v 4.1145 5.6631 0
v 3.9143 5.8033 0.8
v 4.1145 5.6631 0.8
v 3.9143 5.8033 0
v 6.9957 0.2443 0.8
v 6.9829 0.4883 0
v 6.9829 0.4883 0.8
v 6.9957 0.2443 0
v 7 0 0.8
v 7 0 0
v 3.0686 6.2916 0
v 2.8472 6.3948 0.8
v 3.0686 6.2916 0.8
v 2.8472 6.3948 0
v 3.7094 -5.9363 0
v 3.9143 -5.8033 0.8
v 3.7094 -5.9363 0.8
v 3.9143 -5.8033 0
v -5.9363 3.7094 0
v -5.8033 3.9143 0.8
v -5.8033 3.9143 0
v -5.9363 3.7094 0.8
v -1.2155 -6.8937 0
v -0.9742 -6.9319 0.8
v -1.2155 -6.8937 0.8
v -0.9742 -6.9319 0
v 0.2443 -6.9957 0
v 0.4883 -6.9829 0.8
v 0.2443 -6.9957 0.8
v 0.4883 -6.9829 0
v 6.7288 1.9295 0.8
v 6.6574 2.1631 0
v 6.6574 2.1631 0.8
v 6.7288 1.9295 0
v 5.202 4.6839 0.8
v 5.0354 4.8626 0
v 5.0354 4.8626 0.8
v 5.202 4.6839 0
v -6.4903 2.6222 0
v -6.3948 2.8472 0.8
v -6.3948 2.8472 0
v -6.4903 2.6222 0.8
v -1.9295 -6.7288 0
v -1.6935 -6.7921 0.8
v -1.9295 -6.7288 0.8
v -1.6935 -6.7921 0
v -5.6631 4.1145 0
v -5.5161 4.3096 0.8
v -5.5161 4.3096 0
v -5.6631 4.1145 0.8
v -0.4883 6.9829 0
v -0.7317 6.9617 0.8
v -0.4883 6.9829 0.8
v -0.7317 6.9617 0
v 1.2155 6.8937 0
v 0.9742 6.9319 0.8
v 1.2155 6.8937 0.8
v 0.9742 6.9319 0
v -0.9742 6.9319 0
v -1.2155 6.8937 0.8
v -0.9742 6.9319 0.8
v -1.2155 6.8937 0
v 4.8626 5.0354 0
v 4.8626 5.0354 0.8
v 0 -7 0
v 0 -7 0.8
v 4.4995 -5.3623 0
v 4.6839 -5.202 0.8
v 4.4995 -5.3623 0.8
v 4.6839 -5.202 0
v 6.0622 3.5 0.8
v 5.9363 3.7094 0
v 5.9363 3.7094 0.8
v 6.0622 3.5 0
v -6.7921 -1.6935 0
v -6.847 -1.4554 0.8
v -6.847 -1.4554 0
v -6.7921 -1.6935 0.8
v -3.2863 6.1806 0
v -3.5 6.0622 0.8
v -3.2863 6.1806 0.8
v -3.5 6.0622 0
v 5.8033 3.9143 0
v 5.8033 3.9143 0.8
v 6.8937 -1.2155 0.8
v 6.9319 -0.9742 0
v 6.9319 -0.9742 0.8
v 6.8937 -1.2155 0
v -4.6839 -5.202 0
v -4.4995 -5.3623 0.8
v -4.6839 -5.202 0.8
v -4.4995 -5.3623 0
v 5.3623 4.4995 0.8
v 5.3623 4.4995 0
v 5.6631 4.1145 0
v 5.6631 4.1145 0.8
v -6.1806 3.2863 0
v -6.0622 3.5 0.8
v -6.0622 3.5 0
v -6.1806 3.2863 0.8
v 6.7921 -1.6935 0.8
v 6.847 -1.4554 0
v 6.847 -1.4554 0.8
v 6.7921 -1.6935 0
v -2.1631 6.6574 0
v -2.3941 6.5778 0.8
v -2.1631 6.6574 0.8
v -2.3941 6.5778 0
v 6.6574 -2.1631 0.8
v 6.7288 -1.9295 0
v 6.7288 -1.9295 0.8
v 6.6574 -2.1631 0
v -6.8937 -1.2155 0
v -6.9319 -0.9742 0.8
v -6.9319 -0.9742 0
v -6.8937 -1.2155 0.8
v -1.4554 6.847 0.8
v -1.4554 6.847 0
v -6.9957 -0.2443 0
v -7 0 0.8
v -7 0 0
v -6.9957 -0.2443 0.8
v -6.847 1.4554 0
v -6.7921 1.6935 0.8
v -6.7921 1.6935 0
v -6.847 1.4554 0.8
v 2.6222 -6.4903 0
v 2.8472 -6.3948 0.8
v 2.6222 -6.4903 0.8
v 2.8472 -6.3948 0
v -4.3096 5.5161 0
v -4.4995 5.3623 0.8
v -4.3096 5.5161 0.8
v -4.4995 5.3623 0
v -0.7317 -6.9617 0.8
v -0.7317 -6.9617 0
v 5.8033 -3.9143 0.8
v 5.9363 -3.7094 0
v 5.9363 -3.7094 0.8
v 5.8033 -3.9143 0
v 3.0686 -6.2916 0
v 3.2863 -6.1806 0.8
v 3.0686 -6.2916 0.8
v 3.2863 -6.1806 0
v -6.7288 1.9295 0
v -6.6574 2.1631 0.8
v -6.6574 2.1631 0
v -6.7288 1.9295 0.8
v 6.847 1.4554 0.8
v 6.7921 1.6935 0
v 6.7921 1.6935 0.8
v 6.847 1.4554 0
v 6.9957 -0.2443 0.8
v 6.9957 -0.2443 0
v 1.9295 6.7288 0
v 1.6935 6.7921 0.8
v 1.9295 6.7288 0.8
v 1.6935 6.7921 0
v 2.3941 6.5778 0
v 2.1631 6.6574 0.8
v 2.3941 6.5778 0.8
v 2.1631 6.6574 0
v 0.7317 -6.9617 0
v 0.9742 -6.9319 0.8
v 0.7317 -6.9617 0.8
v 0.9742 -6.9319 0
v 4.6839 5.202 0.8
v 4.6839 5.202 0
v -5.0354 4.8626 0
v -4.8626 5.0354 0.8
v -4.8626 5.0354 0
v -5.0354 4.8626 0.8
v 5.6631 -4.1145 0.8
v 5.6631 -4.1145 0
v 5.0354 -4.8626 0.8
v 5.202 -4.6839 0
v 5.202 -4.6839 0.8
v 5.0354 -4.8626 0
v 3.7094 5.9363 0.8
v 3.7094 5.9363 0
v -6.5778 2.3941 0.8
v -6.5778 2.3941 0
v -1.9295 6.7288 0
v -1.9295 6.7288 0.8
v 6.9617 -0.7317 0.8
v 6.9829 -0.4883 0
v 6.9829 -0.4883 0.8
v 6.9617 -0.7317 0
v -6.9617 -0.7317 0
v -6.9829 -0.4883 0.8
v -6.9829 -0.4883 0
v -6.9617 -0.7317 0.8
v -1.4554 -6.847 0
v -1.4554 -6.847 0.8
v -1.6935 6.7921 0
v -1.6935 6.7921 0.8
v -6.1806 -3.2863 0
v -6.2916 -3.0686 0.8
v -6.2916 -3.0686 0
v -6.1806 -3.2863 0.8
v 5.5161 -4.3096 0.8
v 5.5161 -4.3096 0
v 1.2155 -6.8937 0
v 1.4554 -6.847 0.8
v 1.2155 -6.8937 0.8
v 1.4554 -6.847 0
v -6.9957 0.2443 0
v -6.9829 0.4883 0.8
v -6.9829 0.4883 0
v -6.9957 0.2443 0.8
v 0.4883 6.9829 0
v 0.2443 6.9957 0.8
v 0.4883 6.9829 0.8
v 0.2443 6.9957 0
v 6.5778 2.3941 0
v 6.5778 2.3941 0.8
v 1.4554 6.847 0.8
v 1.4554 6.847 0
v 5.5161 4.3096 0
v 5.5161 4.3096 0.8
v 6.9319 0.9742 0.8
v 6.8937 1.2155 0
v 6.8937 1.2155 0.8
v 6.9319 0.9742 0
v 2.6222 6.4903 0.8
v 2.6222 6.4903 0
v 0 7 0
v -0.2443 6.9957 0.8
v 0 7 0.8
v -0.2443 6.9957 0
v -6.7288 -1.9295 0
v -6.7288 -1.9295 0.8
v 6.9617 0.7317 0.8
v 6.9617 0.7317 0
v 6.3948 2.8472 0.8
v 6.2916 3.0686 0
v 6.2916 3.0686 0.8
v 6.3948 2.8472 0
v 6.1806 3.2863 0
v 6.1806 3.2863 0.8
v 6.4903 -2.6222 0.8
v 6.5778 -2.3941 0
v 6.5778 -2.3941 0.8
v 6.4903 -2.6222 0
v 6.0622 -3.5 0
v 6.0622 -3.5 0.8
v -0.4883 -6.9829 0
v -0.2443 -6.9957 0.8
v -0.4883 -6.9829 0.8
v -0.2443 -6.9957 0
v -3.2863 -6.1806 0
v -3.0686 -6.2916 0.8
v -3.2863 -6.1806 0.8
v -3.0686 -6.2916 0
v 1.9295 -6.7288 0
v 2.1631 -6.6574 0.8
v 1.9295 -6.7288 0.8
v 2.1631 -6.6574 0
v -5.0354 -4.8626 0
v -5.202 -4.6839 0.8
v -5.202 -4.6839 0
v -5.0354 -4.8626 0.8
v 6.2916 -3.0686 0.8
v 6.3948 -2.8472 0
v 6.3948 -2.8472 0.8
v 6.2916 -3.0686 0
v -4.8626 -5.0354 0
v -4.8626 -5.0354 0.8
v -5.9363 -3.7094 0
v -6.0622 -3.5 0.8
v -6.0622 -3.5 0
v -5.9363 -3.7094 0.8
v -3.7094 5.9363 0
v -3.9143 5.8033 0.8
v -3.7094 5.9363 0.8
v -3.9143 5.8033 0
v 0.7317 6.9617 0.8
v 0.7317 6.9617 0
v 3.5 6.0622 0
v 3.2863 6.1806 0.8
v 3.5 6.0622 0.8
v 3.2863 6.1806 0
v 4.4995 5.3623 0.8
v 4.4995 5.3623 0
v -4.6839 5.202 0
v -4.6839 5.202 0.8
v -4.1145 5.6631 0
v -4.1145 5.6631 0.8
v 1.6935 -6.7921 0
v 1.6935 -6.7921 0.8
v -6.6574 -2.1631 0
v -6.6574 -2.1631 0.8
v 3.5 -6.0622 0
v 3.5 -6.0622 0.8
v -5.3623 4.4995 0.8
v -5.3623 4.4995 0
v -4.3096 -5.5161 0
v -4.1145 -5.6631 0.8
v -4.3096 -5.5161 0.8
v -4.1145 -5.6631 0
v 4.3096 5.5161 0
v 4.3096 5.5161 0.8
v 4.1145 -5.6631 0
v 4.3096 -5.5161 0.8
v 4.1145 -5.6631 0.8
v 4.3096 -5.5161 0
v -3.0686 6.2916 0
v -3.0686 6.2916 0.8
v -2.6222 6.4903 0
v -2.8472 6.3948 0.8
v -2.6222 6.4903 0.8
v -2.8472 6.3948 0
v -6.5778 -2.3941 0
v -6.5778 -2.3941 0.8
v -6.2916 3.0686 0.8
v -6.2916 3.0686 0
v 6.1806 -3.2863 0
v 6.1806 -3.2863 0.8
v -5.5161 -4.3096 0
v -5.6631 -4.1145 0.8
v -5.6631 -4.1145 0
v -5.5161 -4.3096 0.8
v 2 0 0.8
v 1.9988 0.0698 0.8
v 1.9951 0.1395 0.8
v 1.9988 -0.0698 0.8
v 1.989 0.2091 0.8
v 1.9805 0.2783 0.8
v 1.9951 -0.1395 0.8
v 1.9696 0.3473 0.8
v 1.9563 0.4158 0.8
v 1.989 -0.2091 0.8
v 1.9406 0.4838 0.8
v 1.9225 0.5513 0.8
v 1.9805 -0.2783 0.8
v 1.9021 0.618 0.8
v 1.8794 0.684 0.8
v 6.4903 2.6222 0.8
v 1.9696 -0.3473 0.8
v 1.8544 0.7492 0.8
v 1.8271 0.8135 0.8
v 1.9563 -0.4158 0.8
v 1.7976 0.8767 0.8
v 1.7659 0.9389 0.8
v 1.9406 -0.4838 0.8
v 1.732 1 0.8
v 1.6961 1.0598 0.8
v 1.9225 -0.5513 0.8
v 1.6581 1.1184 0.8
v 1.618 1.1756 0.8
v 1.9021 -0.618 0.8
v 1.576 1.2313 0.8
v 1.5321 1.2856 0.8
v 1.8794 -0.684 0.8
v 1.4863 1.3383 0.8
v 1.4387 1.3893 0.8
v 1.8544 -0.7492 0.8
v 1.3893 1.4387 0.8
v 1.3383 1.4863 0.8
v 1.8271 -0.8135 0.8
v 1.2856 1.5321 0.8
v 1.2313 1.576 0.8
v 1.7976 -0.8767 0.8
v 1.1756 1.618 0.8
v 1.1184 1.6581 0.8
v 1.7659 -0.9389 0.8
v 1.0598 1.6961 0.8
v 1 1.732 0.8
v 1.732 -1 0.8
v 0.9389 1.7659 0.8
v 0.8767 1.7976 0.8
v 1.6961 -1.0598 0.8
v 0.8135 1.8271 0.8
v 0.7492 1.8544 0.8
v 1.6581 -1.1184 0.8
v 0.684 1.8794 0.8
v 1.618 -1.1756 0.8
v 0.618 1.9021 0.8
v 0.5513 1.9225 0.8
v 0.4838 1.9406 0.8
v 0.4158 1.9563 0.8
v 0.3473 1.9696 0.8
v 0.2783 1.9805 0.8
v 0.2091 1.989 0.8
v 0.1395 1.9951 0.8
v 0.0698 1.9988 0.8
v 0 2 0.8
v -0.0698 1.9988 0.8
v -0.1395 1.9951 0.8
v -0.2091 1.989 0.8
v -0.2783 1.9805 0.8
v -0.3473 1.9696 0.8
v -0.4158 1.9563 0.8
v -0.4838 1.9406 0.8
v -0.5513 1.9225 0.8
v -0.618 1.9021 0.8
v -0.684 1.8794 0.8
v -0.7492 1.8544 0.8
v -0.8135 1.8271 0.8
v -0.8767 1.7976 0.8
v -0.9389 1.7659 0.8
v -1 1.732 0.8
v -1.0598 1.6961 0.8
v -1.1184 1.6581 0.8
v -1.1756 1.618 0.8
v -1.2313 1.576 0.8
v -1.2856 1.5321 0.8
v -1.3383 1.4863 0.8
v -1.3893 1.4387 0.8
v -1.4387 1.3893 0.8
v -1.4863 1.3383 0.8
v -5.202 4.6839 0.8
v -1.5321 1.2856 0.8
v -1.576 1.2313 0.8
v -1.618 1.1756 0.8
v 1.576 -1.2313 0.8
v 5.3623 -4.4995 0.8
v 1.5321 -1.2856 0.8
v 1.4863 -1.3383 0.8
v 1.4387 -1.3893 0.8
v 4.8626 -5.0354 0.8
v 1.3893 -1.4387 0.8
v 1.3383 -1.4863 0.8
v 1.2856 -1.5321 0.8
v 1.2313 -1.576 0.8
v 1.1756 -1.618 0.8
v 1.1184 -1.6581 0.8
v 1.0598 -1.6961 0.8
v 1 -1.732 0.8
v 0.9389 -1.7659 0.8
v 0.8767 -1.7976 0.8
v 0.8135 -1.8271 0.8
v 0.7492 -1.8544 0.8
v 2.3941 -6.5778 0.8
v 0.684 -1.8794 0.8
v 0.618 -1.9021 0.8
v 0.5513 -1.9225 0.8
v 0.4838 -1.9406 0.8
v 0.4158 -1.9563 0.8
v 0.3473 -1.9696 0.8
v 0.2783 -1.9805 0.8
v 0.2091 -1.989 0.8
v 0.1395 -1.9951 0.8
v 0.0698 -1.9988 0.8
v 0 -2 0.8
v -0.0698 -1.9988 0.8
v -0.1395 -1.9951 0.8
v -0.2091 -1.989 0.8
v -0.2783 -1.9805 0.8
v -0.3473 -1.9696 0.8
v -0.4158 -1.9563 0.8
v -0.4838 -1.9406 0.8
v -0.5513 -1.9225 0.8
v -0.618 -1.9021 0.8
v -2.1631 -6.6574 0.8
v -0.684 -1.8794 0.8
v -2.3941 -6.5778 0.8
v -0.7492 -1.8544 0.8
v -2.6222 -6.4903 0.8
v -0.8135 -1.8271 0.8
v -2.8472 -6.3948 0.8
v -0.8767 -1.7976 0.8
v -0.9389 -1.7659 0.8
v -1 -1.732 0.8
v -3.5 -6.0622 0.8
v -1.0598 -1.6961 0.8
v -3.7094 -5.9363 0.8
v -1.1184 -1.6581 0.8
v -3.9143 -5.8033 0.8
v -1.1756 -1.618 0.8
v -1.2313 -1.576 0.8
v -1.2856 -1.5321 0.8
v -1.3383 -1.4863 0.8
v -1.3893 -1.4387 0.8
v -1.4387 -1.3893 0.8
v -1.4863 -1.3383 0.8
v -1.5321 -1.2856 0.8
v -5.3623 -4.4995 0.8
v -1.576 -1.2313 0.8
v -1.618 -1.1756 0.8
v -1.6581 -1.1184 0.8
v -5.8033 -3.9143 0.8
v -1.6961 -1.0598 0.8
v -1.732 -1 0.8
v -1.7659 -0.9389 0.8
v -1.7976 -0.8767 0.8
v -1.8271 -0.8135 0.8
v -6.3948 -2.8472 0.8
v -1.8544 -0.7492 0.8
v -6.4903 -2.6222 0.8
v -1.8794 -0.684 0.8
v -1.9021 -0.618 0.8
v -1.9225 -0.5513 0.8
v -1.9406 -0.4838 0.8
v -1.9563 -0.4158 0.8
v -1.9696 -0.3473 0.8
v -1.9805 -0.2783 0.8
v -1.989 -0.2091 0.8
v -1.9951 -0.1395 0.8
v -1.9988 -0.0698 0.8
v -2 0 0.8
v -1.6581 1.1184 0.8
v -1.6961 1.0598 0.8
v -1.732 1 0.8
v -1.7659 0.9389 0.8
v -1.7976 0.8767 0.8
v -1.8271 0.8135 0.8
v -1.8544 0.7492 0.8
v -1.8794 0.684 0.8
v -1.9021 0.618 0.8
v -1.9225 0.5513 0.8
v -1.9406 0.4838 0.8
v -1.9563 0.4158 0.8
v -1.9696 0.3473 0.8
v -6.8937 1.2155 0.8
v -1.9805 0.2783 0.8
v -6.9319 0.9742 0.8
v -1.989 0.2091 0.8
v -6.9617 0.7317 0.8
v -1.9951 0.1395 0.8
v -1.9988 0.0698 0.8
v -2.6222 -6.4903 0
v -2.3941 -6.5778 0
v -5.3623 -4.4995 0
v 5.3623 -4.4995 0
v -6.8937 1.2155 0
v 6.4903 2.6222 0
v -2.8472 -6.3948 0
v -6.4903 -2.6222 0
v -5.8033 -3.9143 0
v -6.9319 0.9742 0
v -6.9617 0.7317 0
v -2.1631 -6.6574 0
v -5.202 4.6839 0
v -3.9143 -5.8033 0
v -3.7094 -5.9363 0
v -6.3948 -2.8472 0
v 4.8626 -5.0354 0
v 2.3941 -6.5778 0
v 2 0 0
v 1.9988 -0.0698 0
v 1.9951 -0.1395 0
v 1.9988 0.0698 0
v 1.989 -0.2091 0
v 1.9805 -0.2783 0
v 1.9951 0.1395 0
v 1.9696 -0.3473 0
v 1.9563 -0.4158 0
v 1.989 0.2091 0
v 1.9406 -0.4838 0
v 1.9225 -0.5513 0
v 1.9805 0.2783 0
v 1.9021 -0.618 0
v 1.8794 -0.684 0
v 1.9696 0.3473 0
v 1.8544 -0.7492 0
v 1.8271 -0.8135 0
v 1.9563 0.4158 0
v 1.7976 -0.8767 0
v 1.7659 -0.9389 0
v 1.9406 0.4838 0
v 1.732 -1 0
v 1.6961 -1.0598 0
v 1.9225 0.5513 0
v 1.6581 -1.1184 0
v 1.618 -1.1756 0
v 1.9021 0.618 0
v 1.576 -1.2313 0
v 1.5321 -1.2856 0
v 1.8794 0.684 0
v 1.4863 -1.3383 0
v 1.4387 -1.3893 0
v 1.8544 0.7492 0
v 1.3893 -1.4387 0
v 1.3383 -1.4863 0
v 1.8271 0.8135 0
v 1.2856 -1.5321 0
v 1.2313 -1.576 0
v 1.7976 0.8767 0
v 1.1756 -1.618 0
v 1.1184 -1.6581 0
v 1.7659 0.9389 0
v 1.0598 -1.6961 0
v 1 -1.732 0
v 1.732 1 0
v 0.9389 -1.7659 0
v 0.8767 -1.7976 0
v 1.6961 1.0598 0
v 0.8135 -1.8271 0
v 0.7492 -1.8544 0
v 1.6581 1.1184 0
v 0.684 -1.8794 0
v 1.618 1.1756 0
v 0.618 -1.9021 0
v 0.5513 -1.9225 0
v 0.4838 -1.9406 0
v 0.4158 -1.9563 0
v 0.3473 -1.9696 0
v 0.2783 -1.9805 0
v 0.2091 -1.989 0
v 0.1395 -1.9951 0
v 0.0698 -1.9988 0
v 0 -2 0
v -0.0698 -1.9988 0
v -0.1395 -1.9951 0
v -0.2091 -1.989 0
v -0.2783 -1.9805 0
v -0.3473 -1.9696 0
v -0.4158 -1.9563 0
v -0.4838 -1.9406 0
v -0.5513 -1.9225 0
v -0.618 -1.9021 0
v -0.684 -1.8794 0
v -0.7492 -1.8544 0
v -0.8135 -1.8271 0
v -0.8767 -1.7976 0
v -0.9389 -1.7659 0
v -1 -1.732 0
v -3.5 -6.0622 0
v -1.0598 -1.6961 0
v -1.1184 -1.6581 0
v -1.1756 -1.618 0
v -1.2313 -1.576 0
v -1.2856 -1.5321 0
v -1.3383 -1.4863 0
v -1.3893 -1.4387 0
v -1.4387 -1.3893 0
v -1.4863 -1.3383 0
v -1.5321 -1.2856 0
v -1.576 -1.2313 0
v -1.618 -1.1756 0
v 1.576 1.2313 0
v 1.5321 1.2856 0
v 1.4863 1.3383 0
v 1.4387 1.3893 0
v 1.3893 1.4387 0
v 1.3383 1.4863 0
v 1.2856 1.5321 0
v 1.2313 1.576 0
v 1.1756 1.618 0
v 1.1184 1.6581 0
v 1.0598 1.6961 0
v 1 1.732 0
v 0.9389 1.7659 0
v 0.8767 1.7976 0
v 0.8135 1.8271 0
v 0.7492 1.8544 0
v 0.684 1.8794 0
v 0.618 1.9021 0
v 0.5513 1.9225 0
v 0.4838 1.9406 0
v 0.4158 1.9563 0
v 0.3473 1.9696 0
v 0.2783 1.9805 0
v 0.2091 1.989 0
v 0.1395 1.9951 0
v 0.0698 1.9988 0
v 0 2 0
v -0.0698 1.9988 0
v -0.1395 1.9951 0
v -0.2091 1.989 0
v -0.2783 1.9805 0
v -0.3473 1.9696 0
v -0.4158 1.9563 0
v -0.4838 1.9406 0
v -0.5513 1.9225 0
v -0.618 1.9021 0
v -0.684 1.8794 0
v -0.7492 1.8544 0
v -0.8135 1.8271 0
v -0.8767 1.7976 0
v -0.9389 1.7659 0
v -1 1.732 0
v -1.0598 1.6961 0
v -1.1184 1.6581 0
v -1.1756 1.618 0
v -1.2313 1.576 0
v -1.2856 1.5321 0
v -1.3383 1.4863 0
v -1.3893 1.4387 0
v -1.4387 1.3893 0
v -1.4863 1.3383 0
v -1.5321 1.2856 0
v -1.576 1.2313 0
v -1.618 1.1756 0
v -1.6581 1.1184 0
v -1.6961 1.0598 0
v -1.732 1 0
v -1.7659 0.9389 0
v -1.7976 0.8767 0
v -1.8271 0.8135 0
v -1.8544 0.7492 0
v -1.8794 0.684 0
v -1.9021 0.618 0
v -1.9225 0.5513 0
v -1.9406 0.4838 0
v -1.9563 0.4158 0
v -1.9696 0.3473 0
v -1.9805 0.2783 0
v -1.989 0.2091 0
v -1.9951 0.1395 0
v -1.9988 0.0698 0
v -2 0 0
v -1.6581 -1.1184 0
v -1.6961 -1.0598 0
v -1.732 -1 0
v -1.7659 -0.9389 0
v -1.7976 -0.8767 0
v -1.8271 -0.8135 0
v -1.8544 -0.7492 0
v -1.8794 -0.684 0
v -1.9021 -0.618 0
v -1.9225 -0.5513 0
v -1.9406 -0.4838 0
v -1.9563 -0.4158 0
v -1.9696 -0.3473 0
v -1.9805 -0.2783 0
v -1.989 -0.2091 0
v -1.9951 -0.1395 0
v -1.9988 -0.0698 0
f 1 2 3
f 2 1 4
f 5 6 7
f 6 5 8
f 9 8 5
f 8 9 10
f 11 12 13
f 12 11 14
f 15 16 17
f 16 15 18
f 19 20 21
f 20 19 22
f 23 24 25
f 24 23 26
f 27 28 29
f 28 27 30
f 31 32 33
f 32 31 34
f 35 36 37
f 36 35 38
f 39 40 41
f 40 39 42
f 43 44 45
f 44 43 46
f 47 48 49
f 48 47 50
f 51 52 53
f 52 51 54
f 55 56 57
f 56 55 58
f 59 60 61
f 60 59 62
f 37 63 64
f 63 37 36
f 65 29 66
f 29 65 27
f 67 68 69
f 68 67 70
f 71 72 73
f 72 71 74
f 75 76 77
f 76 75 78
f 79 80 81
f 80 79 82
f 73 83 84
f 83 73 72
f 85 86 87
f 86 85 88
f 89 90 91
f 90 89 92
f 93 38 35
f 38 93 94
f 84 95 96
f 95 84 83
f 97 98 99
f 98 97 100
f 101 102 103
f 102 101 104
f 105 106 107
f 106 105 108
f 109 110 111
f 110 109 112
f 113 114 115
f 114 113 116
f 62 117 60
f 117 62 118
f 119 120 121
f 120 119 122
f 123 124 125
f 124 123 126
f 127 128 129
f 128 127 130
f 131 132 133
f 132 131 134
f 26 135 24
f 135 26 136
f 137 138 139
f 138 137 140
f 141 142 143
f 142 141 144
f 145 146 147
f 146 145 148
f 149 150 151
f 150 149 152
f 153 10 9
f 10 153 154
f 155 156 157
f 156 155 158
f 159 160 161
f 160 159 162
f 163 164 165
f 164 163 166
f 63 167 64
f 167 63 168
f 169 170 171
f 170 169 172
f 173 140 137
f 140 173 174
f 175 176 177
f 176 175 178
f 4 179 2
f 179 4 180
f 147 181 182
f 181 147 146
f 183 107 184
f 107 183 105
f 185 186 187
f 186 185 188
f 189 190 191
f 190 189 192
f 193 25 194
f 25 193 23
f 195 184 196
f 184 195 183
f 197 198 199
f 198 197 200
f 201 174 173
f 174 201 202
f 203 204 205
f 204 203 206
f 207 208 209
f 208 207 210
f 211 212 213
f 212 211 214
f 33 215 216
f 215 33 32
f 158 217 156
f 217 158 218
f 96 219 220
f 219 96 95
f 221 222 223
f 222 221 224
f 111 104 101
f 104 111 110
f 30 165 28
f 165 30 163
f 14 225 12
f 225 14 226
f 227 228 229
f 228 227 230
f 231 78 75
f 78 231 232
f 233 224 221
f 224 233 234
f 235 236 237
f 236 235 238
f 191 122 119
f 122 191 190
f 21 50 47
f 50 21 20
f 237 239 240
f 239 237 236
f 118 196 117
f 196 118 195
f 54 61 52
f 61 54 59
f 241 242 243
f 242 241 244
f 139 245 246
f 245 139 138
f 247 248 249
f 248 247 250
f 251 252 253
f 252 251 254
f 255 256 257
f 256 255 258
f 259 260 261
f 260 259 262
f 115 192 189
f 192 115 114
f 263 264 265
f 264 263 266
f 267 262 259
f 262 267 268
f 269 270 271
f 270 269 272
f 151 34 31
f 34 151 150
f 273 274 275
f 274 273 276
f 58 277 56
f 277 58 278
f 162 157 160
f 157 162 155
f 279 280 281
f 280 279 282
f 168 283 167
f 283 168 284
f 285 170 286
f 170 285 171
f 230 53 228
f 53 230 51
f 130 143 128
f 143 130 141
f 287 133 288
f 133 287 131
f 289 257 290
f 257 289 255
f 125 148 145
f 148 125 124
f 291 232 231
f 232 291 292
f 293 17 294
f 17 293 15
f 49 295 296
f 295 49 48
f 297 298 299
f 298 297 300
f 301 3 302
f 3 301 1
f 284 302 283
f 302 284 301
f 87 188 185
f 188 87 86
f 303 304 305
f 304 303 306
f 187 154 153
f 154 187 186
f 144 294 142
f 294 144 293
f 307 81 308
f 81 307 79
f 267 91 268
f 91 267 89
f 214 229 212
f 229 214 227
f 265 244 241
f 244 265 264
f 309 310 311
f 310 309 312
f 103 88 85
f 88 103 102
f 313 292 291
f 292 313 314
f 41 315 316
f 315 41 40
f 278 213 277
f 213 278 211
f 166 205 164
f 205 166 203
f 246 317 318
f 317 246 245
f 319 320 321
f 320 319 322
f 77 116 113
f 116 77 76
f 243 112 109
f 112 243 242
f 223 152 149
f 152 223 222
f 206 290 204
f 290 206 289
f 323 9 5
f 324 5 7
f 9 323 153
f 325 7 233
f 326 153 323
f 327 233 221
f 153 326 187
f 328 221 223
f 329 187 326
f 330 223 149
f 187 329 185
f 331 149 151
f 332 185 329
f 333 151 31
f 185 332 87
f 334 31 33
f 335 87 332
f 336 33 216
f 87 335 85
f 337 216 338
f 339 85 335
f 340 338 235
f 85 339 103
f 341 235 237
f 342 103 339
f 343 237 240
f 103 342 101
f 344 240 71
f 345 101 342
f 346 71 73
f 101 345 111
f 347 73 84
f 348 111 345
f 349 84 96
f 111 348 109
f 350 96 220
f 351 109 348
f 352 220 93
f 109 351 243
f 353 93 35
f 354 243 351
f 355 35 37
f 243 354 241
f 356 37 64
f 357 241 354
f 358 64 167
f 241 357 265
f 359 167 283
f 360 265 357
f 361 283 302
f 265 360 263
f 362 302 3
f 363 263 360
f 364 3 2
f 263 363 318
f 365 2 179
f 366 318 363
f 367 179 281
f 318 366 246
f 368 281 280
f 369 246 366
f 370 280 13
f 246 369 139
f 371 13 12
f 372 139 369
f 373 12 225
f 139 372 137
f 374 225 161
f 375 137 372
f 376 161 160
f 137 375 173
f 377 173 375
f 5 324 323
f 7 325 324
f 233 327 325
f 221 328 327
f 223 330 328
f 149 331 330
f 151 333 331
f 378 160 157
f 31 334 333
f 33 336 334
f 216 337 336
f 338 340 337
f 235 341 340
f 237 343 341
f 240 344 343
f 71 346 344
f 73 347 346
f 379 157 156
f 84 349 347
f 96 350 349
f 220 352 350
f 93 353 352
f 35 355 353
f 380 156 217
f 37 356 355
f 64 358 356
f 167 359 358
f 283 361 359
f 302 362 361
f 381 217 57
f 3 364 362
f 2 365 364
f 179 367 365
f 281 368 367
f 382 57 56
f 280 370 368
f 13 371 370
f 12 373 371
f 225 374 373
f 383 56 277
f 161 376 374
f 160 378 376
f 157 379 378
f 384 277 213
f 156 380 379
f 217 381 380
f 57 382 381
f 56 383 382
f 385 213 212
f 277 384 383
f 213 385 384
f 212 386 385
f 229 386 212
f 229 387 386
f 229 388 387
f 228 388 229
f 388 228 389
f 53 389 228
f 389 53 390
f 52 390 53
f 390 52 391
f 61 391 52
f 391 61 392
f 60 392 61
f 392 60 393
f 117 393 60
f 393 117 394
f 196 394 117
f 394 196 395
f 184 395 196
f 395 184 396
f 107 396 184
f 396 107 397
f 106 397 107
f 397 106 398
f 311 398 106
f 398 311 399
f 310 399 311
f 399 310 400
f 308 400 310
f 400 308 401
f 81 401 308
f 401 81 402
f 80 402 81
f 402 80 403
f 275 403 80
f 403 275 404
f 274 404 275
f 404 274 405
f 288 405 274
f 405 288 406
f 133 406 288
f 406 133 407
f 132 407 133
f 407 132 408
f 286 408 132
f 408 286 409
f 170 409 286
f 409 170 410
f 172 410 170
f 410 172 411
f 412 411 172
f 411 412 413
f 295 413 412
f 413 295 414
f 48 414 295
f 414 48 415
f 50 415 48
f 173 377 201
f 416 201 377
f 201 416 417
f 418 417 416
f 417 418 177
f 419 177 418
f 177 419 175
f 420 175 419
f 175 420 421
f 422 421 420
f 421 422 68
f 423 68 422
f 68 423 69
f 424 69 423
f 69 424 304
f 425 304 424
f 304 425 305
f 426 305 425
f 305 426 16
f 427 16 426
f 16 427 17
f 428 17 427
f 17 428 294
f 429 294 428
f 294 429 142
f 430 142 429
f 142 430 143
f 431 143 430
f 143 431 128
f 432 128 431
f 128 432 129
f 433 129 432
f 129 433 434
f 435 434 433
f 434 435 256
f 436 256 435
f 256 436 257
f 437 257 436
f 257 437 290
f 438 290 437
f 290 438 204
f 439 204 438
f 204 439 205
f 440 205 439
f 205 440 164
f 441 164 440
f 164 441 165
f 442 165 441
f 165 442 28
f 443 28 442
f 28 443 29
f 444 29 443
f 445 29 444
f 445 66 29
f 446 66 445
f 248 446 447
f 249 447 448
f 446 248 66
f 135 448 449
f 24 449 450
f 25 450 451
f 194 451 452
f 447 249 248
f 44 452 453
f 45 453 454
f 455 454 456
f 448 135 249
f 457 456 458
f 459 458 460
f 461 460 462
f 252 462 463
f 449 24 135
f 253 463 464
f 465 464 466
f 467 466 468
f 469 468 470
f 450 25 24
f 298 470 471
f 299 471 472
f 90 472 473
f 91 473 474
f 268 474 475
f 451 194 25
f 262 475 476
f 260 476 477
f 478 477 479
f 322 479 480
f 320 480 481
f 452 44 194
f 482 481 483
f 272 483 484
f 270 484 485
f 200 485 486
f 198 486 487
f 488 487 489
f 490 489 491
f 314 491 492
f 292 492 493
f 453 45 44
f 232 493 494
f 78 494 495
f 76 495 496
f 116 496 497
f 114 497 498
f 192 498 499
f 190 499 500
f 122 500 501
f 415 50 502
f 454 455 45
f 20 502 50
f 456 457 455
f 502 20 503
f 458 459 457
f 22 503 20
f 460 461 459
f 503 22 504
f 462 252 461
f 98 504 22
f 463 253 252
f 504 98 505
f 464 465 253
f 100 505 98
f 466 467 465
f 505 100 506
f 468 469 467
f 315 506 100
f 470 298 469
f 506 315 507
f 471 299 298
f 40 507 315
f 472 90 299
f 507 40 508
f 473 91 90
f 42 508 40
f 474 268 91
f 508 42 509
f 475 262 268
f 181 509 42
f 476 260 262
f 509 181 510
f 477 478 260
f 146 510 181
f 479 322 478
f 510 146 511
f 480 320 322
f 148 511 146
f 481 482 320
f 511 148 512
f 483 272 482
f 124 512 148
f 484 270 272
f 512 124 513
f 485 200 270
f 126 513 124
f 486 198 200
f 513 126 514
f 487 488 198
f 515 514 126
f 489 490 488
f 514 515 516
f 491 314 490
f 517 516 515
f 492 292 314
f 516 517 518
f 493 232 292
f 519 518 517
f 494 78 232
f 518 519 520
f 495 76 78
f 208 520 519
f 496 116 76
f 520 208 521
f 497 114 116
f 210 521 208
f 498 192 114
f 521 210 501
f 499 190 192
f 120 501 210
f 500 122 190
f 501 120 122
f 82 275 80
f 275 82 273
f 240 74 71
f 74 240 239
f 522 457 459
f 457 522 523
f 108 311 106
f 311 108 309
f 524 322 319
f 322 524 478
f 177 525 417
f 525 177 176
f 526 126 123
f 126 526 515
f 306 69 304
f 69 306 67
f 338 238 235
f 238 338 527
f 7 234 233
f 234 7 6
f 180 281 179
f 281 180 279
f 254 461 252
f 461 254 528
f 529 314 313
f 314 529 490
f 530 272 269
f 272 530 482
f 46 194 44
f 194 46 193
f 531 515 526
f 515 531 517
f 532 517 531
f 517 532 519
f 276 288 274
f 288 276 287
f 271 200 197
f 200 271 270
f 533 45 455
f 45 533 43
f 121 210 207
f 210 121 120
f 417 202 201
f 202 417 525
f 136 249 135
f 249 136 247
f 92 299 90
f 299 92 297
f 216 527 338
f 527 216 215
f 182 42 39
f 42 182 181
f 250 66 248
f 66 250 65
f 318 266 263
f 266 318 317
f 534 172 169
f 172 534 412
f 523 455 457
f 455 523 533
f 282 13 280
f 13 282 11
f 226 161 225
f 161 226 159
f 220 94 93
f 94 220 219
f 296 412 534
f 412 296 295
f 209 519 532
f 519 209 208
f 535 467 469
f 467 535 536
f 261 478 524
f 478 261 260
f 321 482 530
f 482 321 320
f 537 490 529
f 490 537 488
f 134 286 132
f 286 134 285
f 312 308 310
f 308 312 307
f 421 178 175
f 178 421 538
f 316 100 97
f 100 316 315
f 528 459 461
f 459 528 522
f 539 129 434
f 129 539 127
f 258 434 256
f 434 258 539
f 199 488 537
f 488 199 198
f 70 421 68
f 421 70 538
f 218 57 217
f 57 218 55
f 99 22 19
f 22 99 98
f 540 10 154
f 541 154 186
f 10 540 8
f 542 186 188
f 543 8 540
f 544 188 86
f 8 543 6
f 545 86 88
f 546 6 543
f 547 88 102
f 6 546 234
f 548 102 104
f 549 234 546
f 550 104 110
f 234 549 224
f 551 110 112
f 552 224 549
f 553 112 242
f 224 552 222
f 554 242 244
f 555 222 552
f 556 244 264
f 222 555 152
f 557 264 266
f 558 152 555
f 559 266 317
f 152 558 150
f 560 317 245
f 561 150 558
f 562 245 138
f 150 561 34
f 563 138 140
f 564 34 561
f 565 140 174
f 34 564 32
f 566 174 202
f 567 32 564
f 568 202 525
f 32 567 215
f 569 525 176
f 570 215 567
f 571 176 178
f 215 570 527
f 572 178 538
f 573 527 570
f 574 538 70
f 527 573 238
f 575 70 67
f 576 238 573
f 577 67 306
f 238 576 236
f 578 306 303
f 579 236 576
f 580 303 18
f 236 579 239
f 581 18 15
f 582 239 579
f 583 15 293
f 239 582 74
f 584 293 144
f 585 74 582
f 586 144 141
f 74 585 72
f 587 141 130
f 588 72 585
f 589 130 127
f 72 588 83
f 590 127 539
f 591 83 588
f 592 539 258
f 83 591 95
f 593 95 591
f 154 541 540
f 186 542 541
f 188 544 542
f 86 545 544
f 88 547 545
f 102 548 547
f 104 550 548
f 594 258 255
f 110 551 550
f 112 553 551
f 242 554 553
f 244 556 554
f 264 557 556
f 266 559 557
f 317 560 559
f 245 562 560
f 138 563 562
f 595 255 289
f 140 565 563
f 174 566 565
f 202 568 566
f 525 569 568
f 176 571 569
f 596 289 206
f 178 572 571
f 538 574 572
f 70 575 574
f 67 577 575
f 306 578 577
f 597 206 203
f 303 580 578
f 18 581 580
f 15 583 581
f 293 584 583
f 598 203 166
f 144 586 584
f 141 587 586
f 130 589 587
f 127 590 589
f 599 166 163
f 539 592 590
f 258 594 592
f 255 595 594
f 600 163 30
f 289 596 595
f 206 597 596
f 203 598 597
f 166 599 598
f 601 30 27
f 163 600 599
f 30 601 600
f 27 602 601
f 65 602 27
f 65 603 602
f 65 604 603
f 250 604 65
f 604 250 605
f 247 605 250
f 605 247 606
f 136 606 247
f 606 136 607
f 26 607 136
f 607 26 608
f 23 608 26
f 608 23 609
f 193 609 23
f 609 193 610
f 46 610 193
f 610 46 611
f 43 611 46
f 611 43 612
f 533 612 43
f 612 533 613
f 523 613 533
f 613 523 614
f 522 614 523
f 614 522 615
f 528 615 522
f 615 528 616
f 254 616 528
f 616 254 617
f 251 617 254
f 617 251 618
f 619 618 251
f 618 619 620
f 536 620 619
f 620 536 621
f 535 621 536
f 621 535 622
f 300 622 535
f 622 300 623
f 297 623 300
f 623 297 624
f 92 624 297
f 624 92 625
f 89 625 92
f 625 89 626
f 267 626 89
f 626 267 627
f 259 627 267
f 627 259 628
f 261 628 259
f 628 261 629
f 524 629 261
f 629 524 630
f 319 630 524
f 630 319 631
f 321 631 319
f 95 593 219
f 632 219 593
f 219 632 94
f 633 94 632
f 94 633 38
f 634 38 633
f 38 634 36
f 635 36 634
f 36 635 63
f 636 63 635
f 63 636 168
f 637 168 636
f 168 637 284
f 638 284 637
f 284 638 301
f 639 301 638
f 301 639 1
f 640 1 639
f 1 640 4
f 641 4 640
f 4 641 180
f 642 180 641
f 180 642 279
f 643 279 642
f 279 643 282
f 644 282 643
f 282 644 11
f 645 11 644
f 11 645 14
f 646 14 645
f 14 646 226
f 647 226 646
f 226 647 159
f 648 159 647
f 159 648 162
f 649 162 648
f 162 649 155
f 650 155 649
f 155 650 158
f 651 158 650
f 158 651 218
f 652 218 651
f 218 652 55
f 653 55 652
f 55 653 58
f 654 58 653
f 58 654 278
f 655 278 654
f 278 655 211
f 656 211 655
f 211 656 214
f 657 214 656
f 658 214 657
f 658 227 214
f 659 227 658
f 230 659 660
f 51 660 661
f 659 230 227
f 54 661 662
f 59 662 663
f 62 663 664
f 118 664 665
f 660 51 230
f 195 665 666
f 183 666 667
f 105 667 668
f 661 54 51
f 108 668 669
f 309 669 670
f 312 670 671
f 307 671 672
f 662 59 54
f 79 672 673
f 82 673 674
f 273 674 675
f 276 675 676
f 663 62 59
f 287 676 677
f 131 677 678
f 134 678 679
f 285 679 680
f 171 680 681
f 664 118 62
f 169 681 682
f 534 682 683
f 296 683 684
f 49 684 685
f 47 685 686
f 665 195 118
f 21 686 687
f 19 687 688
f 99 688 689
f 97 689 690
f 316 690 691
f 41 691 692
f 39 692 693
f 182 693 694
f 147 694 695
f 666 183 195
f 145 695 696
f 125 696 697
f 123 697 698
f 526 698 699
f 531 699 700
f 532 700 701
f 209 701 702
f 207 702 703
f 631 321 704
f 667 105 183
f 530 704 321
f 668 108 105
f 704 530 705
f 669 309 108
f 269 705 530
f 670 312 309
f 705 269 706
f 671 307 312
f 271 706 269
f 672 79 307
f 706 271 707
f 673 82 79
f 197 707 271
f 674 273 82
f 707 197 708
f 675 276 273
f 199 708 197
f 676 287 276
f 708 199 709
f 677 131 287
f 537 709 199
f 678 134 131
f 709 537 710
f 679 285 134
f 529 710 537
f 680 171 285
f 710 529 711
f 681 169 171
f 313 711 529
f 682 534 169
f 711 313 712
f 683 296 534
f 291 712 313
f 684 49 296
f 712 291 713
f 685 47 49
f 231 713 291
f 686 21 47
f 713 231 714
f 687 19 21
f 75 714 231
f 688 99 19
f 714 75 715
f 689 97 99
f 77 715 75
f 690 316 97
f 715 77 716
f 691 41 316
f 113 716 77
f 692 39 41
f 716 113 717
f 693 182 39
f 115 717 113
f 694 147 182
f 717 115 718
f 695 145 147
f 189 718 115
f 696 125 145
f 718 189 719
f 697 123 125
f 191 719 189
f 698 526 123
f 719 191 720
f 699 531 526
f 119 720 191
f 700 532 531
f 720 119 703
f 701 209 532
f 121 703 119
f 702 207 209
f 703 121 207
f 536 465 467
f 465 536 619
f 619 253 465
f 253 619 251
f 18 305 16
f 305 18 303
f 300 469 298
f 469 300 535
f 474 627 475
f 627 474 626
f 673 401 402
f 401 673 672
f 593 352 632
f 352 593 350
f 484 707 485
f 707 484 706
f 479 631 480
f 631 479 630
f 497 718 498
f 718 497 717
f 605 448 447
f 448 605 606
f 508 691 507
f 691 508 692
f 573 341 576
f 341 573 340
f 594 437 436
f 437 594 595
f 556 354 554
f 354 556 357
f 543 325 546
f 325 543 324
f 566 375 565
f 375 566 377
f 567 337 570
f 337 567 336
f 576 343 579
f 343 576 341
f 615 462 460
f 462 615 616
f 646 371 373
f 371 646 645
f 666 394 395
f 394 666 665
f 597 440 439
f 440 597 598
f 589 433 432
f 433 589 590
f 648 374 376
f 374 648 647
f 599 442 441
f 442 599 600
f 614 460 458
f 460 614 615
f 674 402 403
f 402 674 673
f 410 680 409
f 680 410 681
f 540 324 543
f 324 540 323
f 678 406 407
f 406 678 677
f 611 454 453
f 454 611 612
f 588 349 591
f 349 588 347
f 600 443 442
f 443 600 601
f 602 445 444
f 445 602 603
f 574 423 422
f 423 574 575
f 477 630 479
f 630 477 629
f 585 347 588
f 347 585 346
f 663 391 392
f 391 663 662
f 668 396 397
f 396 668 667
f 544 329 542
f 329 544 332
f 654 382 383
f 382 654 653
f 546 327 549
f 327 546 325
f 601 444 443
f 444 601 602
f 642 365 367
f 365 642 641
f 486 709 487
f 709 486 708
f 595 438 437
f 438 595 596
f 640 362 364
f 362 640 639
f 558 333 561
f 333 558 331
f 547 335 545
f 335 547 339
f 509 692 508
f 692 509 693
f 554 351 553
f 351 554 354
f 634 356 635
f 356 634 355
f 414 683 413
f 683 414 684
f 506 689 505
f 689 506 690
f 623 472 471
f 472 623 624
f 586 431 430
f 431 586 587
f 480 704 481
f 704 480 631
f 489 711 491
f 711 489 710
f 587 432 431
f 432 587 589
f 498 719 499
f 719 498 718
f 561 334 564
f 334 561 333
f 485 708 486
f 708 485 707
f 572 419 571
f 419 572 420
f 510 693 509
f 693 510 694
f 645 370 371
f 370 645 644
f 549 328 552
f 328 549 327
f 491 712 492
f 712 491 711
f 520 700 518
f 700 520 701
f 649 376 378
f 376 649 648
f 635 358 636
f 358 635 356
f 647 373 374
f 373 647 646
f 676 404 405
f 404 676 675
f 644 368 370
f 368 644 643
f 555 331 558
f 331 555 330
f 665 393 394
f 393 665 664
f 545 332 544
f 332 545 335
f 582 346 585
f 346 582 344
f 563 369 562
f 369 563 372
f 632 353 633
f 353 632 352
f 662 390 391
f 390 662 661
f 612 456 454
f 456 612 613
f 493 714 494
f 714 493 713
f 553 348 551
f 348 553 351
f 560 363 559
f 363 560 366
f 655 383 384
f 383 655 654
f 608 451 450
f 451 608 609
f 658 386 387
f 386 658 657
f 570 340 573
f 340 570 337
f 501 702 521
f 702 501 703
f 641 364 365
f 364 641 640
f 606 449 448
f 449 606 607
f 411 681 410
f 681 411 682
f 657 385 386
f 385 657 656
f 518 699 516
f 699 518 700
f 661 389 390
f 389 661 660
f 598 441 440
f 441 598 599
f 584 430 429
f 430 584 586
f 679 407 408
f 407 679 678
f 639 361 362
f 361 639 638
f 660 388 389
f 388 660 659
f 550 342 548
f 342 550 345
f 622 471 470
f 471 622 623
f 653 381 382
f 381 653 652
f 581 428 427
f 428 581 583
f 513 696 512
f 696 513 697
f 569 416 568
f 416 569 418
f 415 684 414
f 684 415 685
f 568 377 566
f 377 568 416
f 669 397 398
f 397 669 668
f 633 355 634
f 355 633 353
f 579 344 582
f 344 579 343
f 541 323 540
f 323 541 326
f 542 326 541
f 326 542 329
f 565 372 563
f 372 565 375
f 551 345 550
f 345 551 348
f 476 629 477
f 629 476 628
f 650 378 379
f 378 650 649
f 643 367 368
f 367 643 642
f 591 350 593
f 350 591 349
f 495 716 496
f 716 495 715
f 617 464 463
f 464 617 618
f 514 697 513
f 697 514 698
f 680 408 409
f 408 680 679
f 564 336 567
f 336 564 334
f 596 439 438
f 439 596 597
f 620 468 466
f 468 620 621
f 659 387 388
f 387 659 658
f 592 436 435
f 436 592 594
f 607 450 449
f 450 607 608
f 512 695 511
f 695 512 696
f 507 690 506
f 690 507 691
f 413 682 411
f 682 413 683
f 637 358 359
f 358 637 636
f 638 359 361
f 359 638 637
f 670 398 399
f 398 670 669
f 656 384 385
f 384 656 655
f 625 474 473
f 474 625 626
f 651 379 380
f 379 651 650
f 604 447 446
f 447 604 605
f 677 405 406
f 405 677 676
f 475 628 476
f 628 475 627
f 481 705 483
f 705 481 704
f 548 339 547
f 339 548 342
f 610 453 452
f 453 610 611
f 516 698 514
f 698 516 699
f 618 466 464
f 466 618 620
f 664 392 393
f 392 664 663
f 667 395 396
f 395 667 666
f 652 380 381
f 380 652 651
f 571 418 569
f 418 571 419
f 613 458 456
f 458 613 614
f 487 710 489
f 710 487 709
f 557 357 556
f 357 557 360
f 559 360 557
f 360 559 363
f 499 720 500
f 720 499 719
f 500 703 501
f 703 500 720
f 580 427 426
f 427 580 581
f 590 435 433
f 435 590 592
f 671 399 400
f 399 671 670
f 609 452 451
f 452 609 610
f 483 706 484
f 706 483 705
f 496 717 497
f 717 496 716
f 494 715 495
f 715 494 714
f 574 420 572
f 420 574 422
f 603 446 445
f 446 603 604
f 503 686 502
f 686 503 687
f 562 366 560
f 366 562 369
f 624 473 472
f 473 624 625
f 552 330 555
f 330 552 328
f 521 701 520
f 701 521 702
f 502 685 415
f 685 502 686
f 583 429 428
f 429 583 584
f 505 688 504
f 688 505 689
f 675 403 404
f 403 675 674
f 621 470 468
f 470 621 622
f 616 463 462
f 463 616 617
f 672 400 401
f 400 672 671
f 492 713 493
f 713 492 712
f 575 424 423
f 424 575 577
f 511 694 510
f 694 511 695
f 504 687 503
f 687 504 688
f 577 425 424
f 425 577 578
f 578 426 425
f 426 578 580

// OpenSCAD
$fn = 180;

inner_d = 4.0;
outer_d = 14.0;
thickness = 0.8;

difference() {
  cylinder(d = outer_d, h = thickness);
  translate([0, 0, -0.1])
    cylinder(d = inner_d, h = thickness + 0.2);
}
